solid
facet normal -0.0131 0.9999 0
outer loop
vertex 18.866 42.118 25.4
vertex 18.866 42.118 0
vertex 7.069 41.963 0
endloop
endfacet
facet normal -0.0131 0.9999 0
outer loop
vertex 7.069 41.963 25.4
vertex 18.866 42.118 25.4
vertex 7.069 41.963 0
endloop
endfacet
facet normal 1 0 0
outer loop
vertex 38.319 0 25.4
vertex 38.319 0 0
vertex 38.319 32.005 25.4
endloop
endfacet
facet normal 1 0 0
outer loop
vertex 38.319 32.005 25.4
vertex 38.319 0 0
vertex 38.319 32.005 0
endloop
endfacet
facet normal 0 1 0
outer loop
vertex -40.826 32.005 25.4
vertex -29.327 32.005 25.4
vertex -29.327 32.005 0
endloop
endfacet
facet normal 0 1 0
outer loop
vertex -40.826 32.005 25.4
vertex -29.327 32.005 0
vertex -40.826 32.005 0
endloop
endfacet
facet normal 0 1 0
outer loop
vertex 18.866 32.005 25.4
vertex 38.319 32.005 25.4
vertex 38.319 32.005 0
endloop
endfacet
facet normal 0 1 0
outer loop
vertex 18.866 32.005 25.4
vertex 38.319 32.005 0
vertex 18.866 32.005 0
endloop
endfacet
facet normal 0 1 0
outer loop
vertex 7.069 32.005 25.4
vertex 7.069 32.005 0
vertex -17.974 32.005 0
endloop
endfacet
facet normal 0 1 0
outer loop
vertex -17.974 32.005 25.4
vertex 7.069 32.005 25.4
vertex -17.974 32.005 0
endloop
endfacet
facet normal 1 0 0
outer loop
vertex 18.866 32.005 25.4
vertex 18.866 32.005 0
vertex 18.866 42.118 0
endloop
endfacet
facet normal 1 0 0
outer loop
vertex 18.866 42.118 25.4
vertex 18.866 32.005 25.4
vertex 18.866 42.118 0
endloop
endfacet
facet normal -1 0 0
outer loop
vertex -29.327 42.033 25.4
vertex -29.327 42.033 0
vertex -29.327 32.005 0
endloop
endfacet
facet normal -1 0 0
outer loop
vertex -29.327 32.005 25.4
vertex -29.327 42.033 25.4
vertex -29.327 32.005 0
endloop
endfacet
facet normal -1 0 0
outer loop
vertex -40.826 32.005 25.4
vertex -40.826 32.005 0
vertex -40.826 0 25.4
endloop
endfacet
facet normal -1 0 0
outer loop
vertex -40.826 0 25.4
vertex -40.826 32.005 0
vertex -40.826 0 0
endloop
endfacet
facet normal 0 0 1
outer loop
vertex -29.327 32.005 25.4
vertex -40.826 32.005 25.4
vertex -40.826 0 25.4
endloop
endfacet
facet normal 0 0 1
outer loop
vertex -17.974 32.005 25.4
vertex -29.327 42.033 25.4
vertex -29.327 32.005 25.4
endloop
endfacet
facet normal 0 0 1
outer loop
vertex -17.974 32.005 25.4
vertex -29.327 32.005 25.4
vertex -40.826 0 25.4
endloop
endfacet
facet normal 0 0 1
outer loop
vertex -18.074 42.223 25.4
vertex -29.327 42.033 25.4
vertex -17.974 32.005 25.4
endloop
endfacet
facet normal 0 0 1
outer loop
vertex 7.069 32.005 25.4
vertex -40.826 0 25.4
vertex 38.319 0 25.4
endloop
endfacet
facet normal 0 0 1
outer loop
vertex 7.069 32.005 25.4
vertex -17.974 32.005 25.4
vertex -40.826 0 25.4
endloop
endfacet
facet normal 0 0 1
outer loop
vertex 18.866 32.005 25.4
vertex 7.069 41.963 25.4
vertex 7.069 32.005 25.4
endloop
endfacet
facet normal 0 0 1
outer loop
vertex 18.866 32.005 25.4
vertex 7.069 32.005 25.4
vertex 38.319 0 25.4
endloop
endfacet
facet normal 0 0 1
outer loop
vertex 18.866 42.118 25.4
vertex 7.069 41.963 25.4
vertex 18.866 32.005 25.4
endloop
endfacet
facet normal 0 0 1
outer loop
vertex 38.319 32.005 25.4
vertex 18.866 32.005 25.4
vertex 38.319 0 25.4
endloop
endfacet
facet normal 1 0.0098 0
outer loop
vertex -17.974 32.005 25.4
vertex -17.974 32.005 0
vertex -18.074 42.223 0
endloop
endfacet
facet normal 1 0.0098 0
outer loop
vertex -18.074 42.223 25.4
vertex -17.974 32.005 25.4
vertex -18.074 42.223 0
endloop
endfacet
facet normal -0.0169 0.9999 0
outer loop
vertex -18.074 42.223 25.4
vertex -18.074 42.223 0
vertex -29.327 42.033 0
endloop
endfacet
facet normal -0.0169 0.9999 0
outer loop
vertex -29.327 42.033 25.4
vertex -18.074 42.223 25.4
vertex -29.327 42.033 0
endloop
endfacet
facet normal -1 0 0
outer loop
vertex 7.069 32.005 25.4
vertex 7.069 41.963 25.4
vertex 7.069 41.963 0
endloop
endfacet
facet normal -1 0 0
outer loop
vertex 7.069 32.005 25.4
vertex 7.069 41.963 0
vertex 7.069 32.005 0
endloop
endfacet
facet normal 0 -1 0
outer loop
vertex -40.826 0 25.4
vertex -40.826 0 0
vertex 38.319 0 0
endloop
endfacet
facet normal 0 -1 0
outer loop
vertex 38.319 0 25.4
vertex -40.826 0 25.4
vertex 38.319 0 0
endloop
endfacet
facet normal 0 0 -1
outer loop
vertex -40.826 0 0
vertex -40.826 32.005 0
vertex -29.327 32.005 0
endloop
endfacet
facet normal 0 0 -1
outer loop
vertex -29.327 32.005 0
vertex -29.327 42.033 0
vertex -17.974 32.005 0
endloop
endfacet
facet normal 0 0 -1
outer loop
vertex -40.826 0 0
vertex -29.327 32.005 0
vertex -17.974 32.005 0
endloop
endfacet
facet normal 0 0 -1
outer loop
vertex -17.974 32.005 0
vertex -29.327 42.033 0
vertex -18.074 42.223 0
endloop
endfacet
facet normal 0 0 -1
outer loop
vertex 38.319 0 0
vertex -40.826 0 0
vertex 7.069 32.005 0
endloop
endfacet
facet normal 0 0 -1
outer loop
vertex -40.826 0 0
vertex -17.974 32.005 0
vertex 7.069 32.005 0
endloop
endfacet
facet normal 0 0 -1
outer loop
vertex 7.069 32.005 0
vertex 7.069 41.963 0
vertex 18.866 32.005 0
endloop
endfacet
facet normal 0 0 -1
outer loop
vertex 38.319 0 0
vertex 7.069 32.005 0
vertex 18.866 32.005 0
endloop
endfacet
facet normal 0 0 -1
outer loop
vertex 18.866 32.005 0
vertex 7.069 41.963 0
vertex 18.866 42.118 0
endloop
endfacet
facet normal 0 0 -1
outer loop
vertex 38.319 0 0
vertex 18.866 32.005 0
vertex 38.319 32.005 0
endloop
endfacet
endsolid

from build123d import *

# Parameters (mm, degrees)
F1_DEPTH = 25.4
F2_DEPTH = 25.4


with BuildPart() as f1:
    # F0 (on Top) → F1 (new body)
    with BuildSketch(Plane.XY):
        Polygon((-29.327272, 32.004528), (-40.825695, 32.004528), (-40.825695, 0), (38.318675, 0), (38.318675, 32.004528), (18.865567, 32.004528), (7.069093, 32.004528), (0, 32.004528), (0, 18.464023), (5.171617, 18.464023), (4.928618, 13.130507), (0, 13.130507), (0, 7.304969), (-8.66149, 7.304969), (-8.66149, 13.279019), (-13.442378, 13.279019), (-13.442378, 18.870654), (-8.66149, 18.870654), (-8.66149, 32.004528), (-17.973778, 32.004528), align=None)
    extrude(amount=F1_DEPTH)

    # F0 (on Top) → F2 (join)
    with BuildSketch(Plane.XY):
        Polygon((-29.327272, 32.004528), (-40.825695, 32.004528), (-40.825695, 0), (38.318675, 0), (38.318675, 32.004528), (18.865567, 32.004528), (7.069093, 32.004528), (0, 32.004528), (0, 18.464023), (5.171617, 18.464023), (4.928618, 13.130507), (0, 13.130507), (0, 7.304969), (-8.66149, 7.304969), (-8.66149, 13.279019), (-13.442378, 13.279019), (-13.442378, 18.870654), (-8.66149, 18.870654), (-8.66149, 32.004528), (-17.973778, 32.004528), align=None)
        Polygon((-29.327272, 42.033378), (-29.327272, 32.004528), (-17.973778, 32.004528), (-18.074421, 42.22302), align=None)
        Polygon((0, 32.004528), (-8.66149, 32.004528), (-8.66149, 18.870654), (-13.442378, 18.870654), (-13.442378, 13.279019), (-8.66149, 13.279019), (-8.66149, 7.304969), (0, 7.304969), (0, 13.130507), (4.928618, 13.130507), (5.171617, 18.464023), (0, 18.464023), align=None)
        Polygon((7.069093, 32.004528), (18.865567, 32.004528), (18.865567, 42.118017), (7.069093, 41.962616), align=None)
    extrude(amount=F2_DEPTH)


solid = f1.part
